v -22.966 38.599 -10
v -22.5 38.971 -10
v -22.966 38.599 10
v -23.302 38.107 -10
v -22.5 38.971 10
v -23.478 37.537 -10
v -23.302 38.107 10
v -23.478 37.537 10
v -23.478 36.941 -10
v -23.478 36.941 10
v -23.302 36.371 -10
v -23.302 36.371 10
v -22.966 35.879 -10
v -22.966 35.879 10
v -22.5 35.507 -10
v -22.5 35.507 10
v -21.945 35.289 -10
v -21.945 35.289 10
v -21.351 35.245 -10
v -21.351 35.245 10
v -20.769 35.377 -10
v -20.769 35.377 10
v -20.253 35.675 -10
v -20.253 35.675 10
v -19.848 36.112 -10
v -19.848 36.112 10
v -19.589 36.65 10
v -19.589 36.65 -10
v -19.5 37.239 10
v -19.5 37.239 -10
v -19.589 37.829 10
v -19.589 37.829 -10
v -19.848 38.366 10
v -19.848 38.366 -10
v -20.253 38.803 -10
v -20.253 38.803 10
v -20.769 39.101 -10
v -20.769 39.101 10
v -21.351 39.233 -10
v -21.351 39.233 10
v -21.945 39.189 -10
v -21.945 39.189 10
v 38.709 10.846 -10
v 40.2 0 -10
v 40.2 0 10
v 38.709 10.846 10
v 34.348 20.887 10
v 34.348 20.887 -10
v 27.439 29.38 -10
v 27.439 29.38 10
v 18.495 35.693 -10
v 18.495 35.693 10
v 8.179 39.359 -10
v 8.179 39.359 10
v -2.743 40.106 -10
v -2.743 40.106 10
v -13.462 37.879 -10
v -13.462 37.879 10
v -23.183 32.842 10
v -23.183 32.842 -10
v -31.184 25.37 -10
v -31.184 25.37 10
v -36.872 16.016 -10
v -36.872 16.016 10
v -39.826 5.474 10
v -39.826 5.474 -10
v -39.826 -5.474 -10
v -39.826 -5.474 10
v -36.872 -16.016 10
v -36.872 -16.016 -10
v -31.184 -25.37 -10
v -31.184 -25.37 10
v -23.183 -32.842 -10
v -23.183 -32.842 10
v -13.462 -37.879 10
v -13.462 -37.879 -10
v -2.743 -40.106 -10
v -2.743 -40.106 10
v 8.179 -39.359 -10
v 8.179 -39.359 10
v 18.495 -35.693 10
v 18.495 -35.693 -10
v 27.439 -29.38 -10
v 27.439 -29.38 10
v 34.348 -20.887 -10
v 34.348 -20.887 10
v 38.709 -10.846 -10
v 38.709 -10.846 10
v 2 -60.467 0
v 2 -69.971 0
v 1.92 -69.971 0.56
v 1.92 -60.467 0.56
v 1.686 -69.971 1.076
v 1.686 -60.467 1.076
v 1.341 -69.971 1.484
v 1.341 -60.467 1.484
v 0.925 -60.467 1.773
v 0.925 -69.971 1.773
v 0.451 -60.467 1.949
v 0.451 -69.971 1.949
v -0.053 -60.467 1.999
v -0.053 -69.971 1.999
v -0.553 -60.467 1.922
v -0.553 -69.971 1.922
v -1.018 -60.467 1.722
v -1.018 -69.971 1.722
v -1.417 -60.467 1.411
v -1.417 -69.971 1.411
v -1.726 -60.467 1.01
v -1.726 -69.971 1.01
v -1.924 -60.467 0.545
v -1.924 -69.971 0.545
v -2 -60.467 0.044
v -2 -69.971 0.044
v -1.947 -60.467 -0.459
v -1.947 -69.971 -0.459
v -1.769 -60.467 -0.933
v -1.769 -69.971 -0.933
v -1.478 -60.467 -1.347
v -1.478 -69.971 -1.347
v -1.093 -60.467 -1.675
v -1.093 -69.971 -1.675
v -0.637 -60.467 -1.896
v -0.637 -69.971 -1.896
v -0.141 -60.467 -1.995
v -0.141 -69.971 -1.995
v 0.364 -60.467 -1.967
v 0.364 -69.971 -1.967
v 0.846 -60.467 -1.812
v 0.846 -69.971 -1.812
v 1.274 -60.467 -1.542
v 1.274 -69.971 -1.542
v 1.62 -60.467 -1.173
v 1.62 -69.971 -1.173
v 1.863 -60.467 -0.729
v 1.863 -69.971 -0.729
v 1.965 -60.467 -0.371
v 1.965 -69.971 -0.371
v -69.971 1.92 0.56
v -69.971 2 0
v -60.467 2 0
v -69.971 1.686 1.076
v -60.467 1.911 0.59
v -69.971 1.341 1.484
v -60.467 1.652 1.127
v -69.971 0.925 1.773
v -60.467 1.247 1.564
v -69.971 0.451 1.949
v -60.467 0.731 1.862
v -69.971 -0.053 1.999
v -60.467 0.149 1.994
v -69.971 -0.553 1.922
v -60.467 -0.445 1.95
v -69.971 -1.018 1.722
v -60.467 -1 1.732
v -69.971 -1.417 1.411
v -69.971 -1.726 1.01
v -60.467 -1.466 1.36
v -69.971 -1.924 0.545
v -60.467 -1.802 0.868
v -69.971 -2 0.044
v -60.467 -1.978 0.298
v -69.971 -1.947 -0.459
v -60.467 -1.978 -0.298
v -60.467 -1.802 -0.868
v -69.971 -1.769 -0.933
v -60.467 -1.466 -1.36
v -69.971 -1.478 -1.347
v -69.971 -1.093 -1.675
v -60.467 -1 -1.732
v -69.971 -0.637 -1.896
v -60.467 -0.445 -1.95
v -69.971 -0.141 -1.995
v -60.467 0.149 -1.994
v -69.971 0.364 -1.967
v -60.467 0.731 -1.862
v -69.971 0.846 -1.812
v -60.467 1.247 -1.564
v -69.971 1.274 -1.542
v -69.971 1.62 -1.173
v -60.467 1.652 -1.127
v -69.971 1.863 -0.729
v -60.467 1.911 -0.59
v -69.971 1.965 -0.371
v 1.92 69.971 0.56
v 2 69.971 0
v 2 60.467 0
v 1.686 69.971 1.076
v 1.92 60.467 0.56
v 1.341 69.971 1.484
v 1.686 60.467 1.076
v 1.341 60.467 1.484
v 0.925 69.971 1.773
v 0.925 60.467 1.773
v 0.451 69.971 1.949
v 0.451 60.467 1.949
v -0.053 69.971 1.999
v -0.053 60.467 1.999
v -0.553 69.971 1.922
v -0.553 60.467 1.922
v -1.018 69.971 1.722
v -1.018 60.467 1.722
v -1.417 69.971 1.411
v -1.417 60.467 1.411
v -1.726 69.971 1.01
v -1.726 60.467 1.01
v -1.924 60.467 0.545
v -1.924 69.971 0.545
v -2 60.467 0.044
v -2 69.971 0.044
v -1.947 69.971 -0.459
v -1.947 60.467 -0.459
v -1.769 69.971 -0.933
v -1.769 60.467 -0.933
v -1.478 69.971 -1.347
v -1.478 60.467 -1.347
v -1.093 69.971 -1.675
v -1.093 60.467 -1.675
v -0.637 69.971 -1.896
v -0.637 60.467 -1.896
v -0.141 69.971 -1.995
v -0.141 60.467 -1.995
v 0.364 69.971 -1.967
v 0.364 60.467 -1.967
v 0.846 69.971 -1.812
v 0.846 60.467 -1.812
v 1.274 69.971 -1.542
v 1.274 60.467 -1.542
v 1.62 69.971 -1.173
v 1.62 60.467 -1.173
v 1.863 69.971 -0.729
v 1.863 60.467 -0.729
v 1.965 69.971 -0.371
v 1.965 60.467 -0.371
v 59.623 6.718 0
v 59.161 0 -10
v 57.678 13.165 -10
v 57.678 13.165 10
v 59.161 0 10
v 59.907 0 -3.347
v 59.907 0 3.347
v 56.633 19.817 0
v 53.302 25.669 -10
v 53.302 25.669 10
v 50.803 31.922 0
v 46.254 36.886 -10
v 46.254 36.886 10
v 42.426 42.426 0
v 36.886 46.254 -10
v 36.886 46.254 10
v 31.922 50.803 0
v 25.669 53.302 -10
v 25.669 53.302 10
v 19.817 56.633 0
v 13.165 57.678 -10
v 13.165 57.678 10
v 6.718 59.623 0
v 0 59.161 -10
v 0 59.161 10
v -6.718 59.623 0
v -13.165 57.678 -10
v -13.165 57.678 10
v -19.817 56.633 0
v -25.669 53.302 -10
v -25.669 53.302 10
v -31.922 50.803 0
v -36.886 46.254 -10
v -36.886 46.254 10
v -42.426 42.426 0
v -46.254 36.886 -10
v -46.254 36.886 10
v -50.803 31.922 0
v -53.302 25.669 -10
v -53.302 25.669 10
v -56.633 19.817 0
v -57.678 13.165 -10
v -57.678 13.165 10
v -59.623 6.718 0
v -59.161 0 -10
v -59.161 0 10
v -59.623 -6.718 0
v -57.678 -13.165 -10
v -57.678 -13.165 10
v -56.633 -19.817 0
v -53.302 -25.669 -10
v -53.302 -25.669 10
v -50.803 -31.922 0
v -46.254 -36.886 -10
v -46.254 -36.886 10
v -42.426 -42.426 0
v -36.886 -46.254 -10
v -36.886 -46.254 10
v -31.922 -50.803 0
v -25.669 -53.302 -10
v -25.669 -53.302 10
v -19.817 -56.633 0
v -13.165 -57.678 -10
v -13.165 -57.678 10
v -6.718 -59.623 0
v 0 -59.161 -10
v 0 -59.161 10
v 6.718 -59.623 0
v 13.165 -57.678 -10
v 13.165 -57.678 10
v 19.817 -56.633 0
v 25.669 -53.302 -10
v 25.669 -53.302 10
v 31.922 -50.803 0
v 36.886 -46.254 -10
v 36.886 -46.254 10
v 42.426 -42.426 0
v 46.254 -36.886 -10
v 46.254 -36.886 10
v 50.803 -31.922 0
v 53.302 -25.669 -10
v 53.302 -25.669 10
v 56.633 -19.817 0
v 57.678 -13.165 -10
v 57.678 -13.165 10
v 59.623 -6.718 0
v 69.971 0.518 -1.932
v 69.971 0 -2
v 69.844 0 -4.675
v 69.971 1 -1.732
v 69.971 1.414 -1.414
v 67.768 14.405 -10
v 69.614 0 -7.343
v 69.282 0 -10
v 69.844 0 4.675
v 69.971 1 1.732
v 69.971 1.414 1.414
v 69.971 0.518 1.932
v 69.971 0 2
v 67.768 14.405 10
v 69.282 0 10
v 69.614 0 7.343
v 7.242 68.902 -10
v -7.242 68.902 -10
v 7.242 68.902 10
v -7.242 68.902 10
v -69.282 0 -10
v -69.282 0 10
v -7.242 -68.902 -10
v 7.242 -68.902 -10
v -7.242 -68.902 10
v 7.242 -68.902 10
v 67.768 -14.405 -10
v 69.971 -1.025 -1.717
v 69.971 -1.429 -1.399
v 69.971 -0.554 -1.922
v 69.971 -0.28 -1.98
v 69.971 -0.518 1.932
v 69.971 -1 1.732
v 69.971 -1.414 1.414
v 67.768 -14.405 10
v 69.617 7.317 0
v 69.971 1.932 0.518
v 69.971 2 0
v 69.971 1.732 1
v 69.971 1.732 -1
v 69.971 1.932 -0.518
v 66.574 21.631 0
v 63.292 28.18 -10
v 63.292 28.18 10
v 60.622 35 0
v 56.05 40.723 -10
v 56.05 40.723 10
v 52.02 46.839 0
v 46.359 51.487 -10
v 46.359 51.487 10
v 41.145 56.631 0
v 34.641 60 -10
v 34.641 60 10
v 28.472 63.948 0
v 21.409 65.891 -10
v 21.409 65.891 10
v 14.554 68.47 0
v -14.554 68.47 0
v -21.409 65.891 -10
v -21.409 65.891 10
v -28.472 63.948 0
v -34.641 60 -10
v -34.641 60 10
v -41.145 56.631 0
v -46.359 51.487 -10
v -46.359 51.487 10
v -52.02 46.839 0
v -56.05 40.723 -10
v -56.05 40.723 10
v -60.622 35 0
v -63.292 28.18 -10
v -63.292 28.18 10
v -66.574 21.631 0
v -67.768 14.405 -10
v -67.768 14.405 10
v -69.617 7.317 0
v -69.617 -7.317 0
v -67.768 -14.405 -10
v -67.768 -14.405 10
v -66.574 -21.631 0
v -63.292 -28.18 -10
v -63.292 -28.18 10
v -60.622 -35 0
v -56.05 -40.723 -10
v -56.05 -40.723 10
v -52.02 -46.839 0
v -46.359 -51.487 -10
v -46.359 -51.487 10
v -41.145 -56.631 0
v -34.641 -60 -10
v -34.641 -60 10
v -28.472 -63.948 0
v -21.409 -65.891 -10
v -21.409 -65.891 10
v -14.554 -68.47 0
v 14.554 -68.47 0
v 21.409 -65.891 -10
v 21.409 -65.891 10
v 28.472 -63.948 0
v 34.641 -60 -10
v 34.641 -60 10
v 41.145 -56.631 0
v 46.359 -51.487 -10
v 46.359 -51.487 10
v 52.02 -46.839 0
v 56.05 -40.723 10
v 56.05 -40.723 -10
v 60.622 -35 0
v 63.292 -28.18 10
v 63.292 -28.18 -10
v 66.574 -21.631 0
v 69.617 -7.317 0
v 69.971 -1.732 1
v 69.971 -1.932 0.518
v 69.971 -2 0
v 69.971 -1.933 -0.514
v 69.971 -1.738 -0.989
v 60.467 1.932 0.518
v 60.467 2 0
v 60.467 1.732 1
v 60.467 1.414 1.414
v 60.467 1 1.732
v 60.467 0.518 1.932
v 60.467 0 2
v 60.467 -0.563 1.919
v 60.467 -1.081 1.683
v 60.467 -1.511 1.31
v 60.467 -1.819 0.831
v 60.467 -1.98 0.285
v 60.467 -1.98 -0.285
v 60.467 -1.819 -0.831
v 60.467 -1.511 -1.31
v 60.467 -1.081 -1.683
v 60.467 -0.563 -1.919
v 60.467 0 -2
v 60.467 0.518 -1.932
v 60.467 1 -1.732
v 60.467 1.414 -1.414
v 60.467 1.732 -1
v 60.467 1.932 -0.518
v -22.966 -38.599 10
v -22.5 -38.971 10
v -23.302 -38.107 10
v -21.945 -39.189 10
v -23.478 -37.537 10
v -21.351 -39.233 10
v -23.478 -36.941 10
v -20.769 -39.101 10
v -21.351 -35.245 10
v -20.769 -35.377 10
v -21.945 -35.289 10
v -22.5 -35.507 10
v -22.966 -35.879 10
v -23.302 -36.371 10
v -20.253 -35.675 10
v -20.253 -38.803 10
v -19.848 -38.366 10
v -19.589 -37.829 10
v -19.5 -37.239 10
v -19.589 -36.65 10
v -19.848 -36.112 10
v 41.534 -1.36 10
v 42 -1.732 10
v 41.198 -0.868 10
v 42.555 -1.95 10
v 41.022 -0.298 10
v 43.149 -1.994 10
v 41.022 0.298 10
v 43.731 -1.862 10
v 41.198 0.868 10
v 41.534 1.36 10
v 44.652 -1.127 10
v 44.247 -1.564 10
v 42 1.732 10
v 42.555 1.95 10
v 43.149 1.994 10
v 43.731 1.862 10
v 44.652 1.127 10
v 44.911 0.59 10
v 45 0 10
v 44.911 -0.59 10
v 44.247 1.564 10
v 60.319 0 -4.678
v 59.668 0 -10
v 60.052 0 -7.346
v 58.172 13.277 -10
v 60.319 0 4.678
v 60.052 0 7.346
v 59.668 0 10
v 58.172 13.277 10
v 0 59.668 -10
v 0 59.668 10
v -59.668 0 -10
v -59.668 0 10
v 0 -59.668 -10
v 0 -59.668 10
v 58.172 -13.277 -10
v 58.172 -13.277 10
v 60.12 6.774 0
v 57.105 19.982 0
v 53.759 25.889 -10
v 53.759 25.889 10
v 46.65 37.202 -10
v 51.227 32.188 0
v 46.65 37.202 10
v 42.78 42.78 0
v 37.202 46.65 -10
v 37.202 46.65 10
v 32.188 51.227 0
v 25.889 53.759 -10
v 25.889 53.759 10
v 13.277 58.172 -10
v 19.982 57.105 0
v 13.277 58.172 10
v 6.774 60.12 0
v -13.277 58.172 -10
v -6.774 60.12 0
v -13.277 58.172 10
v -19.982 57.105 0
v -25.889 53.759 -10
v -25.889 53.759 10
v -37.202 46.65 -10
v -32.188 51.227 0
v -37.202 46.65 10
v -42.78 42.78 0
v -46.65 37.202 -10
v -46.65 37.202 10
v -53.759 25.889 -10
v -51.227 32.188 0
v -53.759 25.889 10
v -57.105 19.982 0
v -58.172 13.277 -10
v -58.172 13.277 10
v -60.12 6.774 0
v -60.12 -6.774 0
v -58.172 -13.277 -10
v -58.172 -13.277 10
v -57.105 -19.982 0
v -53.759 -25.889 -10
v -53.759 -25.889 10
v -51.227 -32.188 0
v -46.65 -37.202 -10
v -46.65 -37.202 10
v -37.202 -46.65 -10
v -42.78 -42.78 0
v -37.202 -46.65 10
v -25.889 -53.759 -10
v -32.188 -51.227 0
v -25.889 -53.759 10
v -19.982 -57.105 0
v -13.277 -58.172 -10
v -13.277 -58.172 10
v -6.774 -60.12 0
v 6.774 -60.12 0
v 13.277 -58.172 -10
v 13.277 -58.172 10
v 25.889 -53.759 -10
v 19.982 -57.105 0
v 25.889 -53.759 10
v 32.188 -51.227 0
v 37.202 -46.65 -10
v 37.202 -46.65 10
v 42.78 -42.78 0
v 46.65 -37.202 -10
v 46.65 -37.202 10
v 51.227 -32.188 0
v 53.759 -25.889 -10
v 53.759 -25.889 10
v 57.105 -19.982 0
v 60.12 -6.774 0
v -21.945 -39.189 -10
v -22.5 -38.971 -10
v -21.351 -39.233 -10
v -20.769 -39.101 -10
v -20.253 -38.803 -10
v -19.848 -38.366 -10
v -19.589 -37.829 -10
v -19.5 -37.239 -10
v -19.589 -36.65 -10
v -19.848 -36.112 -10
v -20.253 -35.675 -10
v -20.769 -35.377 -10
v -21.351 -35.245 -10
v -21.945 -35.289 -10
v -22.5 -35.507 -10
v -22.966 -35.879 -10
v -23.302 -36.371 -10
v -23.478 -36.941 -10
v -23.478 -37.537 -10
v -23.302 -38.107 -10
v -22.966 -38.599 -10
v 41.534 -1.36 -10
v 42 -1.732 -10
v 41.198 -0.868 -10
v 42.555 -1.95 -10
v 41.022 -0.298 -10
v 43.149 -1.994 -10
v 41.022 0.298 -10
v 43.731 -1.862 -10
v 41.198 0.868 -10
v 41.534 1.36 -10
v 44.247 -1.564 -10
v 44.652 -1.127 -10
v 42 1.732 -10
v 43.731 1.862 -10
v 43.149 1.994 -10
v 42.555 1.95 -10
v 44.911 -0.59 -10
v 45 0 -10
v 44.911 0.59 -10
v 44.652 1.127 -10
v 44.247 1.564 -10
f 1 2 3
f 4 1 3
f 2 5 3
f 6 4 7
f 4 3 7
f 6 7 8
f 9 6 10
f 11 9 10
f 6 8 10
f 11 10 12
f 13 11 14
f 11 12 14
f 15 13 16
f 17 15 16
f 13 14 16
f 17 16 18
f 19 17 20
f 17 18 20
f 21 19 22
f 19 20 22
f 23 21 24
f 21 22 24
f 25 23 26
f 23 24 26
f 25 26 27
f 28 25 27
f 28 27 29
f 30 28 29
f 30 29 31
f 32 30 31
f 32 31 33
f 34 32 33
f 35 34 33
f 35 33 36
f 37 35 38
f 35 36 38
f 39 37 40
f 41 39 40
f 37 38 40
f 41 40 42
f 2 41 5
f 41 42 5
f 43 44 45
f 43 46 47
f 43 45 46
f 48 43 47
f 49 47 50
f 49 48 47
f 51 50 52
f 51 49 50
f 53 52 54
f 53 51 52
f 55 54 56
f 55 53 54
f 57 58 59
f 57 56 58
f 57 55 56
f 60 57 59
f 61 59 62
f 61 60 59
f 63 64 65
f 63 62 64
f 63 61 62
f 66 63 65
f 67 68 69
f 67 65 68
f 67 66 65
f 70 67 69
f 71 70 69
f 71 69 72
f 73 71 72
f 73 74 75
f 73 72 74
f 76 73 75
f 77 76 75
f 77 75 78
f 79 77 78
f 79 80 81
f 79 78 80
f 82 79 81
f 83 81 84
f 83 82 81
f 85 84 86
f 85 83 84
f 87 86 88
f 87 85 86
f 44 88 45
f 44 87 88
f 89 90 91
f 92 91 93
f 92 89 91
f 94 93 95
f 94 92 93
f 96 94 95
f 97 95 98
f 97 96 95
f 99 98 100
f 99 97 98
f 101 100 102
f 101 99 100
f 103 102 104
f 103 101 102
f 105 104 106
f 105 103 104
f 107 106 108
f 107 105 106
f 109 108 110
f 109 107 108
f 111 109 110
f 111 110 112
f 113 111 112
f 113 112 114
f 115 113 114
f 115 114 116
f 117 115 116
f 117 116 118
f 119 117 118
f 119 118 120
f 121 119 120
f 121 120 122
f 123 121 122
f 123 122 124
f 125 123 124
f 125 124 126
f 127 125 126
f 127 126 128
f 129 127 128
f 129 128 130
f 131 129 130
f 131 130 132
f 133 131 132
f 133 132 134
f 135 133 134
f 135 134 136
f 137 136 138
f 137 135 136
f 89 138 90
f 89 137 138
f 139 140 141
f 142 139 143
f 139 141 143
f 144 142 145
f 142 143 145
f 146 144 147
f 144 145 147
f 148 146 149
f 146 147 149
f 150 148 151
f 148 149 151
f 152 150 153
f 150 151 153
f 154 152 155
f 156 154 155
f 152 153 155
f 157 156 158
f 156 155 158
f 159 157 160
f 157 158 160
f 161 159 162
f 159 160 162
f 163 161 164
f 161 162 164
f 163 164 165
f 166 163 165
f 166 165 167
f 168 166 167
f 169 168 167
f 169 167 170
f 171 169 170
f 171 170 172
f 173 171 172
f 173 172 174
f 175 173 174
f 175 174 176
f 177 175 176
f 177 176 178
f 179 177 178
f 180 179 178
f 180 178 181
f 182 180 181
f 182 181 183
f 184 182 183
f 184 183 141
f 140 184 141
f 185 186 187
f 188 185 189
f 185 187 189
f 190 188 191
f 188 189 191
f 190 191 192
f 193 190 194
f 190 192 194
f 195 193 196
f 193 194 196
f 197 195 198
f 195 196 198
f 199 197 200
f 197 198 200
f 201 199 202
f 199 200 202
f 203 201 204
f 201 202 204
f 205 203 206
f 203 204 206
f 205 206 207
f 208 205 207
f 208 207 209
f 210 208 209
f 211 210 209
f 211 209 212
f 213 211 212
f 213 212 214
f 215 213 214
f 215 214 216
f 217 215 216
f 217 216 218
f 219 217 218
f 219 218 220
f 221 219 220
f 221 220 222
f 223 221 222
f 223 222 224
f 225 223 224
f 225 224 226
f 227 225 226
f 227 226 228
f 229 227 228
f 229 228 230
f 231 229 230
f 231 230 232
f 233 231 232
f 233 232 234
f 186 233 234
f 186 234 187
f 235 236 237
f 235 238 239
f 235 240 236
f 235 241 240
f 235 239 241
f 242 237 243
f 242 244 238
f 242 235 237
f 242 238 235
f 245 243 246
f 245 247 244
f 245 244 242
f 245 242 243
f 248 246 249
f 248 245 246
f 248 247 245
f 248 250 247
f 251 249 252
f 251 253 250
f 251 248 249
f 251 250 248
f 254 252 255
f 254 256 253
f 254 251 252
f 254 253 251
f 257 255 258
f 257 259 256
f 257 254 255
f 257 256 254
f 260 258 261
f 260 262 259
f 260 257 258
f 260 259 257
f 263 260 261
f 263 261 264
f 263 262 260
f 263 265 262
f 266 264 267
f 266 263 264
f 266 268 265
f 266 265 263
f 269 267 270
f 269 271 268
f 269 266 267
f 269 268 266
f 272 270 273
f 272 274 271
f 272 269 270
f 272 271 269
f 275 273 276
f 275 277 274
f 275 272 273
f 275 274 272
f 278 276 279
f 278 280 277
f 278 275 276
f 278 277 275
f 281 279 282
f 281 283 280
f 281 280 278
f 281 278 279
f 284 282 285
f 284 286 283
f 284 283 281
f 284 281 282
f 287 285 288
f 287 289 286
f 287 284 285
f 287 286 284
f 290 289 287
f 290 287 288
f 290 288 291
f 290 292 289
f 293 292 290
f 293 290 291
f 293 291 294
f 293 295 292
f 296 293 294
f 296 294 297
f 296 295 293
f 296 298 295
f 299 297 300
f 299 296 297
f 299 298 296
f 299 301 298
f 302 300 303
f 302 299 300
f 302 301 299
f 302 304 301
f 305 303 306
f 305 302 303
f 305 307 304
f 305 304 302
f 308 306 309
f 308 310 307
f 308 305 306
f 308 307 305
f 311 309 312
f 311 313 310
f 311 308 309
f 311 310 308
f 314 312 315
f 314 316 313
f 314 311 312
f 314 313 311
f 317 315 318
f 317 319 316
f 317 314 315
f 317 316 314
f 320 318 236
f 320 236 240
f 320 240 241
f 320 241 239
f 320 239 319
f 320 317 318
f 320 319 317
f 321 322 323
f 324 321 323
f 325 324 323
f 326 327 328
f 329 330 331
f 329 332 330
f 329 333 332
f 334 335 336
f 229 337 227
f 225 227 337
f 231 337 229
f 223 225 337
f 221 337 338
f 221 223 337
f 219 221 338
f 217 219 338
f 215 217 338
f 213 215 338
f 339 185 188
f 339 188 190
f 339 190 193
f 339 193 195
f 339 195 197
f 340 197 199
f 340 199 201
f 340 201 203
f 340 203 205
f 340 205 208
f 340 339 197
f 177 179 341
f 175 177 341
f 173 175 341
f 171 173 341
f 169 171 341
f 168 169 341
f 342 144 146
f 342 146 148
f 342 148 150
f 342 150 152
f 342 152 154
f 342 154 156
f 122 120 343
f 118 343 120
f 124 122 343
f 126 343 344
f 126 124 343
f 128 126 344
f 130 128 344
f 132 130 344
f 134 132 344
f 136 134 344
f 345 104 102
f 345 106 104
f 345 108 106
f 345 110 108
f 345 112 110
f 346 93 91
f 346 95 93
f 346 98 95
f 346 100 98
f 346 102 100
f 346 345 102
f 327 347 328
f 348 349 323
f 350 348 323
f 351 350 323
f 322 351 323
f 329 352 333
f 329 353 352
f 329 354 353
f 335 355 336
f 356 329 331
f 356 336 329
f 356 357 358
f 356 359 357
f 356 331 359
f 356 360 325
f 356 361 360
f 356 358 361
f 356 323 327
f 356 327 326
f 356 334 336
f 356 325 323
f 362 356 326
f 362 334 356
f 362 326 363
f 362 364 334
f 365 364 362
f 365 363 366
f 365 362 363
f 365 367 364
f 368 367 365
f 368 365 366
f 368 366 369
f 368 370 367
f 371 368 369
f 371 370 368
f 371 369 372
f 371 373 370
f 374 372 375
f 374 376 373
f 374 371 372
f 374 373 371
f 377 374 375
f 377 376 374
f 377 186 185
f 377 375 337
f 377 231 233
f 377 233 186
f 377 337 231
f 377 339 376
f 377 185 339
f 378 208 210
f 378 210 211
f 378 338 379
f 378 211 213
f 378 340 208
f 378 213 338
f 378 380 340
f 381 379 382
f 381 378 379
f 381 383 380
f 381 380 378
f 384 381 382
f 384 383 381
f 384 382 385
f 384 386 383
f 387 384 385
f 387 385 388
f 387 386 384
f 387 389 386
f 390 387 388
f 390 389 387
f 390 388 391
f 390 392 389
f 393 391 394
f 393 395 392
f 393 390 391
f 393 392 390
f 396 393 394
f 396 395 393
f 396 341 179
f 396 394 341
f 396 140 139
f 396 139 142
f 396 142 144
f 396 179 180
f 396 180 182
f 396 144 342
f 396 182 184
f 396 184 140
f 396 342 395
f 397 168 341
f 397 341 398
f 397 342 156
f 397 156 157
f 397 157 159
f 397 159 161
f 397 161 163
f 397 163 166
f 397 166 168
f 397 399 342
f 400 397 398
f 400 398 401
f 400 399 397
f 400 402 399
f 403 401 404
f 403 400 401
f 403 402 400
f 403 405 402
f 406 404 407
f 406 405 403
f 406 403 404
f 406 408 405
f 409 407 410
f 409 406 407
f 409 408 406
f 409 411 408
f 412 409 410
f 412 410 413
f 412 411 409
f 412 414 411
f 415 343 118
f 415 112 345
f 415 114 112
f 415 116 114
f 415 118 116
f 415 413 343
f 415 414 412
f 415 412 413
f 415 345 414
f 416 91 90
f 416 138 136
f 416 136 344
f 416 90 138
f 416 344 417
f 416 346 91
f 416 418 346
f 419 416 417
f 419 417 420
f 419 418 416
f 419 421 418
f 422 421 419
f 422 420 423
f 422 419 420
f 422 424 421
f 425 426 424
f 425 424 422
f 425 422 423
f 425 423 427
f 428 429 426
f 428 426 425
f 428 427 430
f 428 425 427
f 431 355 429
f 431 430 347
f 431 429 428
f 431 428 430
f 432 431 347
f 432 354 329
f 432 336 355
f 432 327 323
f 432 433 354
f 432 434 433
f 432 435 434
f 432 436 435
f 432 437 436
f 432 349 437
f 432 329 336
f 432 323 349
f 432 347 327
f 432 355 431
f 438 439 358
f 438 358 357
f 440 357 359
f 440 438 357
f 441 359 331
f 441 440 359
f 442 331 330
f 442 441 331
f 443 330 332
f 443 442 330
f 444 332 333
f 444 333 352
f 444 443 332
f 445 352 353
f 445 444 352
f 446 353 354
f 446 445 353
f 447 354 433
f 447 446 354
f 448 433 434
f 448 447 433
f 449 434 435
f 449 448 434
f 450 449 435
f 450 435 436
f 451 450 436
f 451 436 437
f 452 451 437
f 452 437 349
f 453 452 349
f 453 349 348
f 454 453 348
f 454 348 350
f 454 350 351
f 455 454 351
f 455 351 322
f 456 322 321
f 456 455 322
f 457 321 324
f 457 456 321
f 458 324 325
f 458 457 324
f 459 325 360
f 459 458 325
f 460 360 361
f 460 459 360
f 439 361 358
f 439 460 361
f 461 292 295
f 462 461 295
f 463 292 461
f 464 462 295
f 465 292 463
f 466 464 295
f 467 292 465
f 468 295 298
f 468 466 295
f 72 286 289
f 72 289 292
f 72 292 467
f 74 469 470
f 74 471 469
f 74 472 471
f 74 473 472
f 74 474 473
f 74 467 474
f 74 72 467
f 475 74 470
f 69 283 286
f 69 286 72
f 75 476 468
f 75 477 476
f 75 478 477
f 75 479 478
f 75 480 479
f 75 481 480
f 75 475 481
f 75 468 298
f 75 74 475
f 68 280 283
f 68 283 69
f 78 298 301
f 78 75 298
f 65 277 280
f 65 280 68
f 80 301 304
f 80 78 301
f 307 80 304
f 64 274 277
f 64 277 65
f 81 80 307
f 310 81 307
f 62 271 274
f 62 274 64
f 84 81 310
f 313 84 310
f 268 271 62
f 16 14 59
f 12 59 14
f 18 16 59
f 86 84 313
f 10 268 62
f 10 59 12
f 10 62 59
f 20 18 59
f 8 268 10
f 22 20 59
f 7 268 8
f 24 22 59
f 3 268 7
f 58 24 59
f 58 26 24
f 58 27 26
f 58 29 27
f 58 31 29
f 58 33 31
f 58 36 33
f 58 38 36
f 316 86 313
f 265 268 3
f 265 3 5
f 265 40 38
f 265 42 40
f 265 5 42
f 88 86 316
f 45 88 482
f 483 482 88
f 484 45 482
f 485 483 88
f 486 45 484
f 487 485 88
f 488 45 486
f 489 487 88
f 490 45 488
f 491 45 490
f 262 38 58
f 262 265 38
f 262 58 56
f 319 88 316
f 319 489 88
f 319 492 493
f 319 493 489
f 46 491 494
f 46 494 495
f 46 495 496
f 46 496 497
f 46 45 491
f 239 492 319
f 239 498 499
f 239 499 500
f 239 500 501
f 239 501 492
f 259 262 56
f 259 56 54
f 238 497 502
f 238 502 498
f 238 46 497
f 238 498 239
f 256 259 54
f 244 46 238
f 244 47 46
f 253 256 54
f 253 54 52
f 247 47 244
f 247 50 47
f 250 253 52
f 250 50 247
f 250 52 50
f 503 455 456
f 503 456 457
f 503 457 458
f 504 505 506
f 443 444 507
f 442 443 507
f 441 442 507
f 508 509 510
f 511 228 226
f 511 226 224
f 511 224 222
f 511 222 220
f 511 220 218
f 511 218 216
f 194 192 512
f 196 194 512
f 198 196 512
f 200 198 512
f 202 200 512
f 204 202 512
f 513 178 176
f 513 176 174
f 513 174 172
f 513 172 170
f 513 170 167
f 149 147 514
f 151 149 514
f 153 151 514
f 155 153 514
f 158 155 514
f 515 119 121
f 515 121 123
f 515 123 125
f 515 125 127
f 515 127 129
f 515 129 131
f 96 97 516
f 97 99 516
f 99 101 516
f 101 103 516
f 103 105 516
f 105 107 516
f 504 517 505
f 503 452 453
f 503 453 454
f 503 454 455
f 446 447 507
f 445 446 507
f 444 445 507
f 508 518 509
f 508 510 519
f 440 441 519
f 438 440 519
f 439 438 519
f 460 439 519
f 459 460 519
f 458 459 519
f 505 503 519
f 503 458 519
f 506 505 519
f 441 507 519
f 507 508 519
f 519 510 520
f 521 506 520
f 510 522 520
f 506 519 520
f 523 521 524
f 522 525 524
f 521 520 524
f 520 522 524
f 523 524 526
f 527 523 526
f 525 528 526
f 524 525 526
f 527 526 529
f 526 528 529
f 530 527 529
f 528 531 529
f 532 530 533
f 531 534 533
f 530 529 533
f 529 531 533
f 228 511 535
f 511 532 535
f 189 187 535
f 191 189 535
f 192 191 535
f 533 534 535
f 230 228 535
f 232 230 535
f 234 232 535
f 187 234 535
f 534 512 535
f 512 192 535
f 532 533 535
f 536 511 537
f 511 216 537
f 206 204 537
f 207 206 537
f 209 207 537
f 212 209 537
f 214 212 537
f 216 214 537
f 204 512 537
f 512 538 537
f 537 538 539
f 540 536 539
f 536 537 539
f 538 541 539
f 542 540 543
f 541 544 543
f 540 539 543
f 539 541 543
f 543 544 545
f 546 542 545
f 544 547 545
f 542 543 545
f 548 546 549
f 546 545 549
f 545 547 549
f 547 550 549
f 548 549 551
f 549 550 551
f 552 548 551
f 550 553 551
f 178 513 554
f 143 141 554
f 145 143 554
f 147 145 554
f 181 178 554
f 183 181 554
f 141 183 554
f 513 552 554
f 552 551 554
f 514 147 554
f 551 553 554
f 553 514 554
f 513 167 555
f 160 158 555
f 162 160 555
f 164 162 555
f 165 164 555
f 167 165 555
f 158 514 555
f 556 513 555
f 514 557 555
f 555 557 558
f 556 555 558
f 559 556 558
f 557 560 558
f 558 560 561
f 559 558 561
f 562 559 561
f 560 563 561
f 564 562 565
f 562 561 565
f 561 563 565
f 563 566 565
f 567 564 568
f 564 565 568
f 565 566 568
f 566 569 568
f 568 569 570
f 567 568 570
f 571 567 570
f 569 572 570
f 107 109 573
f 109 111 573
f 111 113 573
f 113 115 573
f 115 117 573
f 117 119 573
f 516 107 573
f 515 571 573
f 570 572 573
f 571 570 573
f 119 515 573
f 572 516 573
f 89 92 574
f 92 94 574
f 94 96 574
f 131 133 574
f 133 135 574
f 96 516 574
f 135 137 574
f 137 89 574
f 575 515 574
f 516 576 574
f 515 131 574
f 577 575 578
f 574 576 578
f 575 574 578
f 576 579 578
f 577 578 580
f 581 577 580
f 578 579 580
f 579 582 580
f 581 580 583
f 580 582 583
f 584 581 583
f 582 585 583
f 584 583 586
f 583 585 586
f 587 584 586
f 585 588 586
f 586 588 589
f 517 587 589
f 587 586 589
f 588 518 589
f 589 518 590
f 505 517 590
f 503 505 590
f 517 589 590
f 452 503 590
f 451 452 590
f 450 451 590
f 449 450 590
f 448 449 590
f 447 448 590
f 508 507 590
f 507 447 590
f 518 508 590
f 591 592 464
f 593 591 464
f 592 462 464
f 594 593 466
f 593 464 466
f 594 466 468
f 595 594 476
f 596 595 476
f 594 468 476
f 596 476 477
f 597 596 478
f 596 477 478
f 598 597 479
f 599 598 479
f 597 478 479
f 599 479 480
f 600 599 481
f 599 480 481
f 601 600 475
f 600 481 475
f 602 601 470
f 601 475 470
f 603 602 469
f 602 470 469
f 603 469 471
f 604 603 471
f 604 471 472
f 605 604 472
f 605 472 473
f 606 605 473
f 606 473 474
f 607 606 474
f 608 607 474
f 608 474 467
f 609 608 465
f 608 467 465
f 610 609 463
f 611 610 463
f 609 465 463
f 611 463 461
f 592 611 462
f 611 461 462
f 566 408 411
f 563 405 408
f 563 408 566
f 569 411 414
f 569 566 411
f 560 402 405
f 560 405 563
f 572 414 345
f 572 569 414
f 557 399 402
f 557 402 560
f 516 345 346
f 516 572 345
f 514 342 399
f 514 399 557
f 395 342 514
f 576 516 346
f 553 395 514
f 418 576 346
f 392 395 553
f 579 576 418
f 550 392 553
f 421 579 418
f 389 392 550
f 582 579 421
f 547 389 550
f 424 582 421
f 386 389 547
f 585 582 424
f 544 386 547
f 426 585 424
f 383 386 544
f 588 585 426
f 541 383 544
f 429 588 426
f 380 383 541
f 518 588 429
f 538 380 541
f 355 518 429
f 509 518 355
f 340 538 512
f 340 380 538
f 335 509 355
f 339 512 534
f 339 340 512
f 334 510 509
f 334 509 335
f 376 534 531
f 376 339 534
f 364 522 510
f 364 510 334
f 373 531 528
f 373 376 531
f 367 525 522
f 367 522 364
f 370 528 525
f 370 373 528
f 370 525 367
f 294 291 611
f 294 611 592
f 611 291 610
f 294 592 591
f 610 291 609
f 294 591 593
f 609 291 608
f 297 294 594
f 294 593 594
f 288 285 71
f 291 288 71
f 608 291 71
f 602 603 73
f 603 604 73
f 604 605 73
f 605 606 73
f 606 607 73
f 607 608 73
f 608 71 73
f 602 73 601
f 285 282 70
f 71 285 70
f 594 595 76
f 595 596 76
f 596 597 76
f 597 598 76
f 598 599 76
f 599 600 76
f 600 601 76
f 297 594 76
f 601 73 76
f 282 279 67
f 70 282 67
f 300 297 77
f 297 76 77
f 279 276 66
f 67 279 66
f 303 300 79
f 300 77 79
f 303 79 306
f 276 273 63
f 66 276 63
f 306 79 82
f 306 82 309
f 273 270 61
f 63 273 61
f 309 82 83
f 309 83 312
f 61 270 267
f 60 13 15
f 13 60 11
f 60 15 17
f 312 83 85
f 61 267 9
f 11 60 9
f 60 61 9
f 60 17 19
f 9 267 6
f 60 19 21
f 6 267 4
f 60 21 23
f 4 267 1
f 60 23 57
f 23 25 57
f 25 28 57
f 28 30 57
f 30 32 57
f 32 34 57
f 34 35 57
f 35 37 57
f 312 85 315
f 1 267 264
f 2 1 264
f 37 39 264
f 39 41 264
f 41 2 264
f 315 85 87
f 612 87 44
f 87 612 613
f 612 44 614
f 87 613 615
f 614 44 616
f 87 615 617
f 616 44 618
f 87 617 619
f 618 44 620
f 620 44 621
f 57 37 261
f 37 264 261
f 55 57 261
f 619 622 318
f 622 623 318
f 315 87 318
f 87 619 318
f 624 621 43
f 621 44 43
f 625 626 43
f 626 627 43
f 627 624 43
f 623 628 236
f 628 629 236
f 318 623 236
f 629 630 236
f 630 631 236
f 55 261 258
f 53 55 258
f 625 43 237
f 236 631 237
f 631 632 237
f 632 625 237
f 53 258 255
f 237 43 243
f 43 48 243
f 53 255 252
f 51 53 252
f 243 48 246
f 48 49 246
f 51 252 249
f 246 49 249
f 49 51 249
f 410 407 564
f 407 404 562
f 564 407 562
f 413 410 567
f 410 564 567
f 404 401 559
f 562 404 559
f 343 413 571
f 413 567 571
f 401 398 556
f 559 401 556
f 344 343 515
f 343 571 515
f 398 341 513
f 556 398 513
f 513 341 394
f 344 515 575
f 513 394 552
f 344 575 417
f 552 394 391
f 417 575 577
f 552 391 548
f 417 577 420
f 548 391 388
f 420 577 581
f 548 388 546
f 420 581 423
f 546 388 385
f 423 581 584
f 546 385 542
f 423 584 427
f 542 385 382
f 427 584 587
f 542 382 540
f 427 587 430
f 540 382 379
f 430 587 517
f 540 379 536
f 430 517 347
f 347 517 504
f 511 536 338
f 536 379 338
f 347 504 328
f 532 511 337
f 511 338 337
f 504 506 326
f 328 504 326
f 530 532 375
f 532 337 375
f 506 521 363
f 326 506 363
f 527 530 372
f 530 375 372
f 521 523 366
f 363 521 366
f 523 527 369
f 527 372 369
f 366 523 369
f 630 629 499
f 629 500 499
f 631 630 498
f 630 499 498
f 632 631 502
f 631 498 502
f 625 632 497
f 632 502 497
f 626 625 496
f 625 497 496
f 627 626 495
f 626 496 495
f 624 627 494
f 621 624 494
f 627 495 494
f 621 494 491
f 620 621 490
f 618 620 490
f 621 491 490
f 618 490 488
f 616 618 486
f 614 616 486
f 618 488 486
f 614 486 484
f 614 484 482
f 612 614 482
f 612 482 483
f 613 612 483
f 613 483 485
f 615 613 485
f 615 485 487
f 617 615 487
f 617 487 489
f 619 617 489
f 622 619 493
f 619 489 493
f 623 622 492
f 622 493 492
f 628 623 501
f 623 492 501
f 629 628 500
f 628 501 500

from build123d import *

# Parameters (mm, degrees)
BOX003_W             = 150
BOX003_H             = 150
BOX003_DEPTH         = 75
BOX002_W             = 150
BOX002_H             = 150
BOX002_DEPTH         = 75
SKETCH001_R          = 2
POCKET001_DEPTH      = 70.001
POCKET001_DEPTH_BACK = 70.001
SKETCH002_R          = 2
POCKET002_DEPTH      = 70.001
POCKET002_DEPTH_BACK = 70.001
BOX001_W             = 150
BOX001_H             = 150
BOX001_DEPTH         = 75
BOX_W                = 150
BOX_H                = 150
BOX_DEPTH            = 75
CYLINDER_R           = 40.2
CYLINDER_DEPTH       = 100
SKETCH_R             = 2
POCKET_DEPTH         = 351.76115
POCKET_DEPTH_BACK    = 351.76115
POLARPATTERN_COUNT   = 3


with BuildPart() as d_coupe_inf_rieure:
    # Box003 → Box003 (new body)
    with BuildSketch(Plane(origin=(-75, -75, -85), x_dir=(1, 0, 0), z_dir=(0, 0, 1))):
        with Locations((75, 75)):
            Rectangle(BOX003_W, BOX003_H)
    extrude(amount=BOX003_DEPTH)


with BuildPart() as d_coupe_sup_rieure:
    # Box002 → Box002 (new body)
    with BuildSketch(Plane(origin=(-75, -75, 10), x_dir=(1, 0, 0), z_dir=(0, 0, 1))):
        with Locations((75, 75)):
            Rectangle(BOX002_W, BOX002_H)
    extrude(amount=BOX002_DEPTH)


with BuildPart() as trou001:
    # Sphere002 → Sphere002 (revolve)
    with BuildSketch(Plane.XZ):
        with BuildLine():
            ThreePointArc((0, -60.5), (60.5, 0), (0, 60.5))
            Line((0, 60.5), (0, -60.5))
        make_face()
    revolve(axis=Axis((0, 0, 0), (0, 0, 1)))


with BuildPart() as corps:
    # Sphere001 → Sphere001 (revolve)
    with BuildSketch(Plane.XZ):
        with BuildLine():
            ThreePointArc((0, -70), (70, 0), (0, 70))
            Line((0, 70), (0, -70))
        make_face()
    revolve(axis=Axis((0, 0, 0), (0, 0, 1)))

    # Cut003: cut Trou001
    add(trou001.part, mode=Mode.SUBTRACT)

    # Cut004: cut Découpe supérieure
    add(d_coupe_sup_rieure.part, mode=Mode.SUBTRACT)

    # Cut005: cut Découpe inférieure
    add(d_coupe_inf_rieure.part, mode=Mode.SUBTRACT)

    # Sketch001 → Pocket001 (cut, two sides)
    with BuildSketch(Plane.YZ) as pocket001_sk:
        Circle(SKETCH001_R)
    extrude(amount=-POCKET001_DEPTH, mode=Mode.SUBTRACT)
    extrude(pocket001_sk.sketch, amount=POCKET001_DEPTH_BACK, mode=Mode.SUBTRACT)

    # Sketch002 → Pocket002 (cut, two sides)
    with BuildSketch(Plane.XZ) as pocket002_sk:
        Circle(SKETCH002_R)
    extrude(amount=-POCKET002_DEPTH, mode=Mode.SUBTRACT)
    extrude(pocket002_sk.sketch, amount=POCKET002_DEPTH_BACK, mode=Mode.SUBTRACT)


with BuildPart() as d_coupe_basse:
    # Box001 → Box001 (new body)
    with BuildSketch(Plane(origin=(-75, -75, -85), x_dir=(1, 0, 0), z_dir=(0, 0, 1))):
        with Locations((75, 75)):
            Rectangle(BOX001_W, BOX001_H)
    extrude(amount=BOX001_DEPTH)


with BuildPart() as d_coupe_haute:
    # Box → Box (new body)
    with BuildSketch(Plane(origin=(-75, -75, 10), x_dir=(1, 0, 0), z_dir=(0, 0, 1))):
        with Locations((75, 75)):
            Rectangle(BOX_W, BOX_H)
    extrude(amount=BOX_DEPTH)


with BuildPart() as trou:
    # Cylinder → Cylinder (new body)
    with BuildSketch(Plane.XY.offset(-50)):
        Circle(CYLINDER_R)
    extrude(amount=CYLINDER_DEPTH)


with BuildPart() as corps001:
    # Sphere → Sphere (revolve)
    with BuildSketch(Plane.XZ):
        with BuildLine():
            ThreePointArc((0, -60), (60, 0), (0, 60))
            Line((0, 60), (0, -60))
        make_face()
    revolve(axis=Axis((0, 0, 0), (0, 0, 1)))

    # Cut: cut Trou
    add(trou.part, mode=Mode.SUBTRACT)

    # Cut001: cut Découpe haute
    add(d_coupe_haute.part, mode=Mode.SUBTRACT)

    # Cut002: cut Découpe basse
    add(d_coupe_basse.part, mode=Mode.SUBTRACT)

    # Sketch → Pocket (cut, two sides)
    with BuildSketch(Plane(origin=(43, 0, 0), x_dir=(1, 0, 0), z_dir=(0, 0, 1))) as pocket_sk:
        Circle(SKETCH_R)
    pocket = extrude(amount=-POCKET_DEPTH, mode=Mode.SUBTRACT) + extrude(pocket_sk.sketch, amount=POCKET_DEPTH_BACK, mode=Mode.SUBTRACT)

    # PolarPattern: Pocket ×3 about axis
    polarpattern_axis = Axis((0, 0, 0), (0, 0, 1))
    for i in range(1, POLARPATTERN_COUNT):
        add(pocket.rotate(polarpattern_axis, i * 360 / POLARPATTERN_COUNT), mode=Mode.SUBTRACT)


solid = Compound([corps.part, corps001.part])
